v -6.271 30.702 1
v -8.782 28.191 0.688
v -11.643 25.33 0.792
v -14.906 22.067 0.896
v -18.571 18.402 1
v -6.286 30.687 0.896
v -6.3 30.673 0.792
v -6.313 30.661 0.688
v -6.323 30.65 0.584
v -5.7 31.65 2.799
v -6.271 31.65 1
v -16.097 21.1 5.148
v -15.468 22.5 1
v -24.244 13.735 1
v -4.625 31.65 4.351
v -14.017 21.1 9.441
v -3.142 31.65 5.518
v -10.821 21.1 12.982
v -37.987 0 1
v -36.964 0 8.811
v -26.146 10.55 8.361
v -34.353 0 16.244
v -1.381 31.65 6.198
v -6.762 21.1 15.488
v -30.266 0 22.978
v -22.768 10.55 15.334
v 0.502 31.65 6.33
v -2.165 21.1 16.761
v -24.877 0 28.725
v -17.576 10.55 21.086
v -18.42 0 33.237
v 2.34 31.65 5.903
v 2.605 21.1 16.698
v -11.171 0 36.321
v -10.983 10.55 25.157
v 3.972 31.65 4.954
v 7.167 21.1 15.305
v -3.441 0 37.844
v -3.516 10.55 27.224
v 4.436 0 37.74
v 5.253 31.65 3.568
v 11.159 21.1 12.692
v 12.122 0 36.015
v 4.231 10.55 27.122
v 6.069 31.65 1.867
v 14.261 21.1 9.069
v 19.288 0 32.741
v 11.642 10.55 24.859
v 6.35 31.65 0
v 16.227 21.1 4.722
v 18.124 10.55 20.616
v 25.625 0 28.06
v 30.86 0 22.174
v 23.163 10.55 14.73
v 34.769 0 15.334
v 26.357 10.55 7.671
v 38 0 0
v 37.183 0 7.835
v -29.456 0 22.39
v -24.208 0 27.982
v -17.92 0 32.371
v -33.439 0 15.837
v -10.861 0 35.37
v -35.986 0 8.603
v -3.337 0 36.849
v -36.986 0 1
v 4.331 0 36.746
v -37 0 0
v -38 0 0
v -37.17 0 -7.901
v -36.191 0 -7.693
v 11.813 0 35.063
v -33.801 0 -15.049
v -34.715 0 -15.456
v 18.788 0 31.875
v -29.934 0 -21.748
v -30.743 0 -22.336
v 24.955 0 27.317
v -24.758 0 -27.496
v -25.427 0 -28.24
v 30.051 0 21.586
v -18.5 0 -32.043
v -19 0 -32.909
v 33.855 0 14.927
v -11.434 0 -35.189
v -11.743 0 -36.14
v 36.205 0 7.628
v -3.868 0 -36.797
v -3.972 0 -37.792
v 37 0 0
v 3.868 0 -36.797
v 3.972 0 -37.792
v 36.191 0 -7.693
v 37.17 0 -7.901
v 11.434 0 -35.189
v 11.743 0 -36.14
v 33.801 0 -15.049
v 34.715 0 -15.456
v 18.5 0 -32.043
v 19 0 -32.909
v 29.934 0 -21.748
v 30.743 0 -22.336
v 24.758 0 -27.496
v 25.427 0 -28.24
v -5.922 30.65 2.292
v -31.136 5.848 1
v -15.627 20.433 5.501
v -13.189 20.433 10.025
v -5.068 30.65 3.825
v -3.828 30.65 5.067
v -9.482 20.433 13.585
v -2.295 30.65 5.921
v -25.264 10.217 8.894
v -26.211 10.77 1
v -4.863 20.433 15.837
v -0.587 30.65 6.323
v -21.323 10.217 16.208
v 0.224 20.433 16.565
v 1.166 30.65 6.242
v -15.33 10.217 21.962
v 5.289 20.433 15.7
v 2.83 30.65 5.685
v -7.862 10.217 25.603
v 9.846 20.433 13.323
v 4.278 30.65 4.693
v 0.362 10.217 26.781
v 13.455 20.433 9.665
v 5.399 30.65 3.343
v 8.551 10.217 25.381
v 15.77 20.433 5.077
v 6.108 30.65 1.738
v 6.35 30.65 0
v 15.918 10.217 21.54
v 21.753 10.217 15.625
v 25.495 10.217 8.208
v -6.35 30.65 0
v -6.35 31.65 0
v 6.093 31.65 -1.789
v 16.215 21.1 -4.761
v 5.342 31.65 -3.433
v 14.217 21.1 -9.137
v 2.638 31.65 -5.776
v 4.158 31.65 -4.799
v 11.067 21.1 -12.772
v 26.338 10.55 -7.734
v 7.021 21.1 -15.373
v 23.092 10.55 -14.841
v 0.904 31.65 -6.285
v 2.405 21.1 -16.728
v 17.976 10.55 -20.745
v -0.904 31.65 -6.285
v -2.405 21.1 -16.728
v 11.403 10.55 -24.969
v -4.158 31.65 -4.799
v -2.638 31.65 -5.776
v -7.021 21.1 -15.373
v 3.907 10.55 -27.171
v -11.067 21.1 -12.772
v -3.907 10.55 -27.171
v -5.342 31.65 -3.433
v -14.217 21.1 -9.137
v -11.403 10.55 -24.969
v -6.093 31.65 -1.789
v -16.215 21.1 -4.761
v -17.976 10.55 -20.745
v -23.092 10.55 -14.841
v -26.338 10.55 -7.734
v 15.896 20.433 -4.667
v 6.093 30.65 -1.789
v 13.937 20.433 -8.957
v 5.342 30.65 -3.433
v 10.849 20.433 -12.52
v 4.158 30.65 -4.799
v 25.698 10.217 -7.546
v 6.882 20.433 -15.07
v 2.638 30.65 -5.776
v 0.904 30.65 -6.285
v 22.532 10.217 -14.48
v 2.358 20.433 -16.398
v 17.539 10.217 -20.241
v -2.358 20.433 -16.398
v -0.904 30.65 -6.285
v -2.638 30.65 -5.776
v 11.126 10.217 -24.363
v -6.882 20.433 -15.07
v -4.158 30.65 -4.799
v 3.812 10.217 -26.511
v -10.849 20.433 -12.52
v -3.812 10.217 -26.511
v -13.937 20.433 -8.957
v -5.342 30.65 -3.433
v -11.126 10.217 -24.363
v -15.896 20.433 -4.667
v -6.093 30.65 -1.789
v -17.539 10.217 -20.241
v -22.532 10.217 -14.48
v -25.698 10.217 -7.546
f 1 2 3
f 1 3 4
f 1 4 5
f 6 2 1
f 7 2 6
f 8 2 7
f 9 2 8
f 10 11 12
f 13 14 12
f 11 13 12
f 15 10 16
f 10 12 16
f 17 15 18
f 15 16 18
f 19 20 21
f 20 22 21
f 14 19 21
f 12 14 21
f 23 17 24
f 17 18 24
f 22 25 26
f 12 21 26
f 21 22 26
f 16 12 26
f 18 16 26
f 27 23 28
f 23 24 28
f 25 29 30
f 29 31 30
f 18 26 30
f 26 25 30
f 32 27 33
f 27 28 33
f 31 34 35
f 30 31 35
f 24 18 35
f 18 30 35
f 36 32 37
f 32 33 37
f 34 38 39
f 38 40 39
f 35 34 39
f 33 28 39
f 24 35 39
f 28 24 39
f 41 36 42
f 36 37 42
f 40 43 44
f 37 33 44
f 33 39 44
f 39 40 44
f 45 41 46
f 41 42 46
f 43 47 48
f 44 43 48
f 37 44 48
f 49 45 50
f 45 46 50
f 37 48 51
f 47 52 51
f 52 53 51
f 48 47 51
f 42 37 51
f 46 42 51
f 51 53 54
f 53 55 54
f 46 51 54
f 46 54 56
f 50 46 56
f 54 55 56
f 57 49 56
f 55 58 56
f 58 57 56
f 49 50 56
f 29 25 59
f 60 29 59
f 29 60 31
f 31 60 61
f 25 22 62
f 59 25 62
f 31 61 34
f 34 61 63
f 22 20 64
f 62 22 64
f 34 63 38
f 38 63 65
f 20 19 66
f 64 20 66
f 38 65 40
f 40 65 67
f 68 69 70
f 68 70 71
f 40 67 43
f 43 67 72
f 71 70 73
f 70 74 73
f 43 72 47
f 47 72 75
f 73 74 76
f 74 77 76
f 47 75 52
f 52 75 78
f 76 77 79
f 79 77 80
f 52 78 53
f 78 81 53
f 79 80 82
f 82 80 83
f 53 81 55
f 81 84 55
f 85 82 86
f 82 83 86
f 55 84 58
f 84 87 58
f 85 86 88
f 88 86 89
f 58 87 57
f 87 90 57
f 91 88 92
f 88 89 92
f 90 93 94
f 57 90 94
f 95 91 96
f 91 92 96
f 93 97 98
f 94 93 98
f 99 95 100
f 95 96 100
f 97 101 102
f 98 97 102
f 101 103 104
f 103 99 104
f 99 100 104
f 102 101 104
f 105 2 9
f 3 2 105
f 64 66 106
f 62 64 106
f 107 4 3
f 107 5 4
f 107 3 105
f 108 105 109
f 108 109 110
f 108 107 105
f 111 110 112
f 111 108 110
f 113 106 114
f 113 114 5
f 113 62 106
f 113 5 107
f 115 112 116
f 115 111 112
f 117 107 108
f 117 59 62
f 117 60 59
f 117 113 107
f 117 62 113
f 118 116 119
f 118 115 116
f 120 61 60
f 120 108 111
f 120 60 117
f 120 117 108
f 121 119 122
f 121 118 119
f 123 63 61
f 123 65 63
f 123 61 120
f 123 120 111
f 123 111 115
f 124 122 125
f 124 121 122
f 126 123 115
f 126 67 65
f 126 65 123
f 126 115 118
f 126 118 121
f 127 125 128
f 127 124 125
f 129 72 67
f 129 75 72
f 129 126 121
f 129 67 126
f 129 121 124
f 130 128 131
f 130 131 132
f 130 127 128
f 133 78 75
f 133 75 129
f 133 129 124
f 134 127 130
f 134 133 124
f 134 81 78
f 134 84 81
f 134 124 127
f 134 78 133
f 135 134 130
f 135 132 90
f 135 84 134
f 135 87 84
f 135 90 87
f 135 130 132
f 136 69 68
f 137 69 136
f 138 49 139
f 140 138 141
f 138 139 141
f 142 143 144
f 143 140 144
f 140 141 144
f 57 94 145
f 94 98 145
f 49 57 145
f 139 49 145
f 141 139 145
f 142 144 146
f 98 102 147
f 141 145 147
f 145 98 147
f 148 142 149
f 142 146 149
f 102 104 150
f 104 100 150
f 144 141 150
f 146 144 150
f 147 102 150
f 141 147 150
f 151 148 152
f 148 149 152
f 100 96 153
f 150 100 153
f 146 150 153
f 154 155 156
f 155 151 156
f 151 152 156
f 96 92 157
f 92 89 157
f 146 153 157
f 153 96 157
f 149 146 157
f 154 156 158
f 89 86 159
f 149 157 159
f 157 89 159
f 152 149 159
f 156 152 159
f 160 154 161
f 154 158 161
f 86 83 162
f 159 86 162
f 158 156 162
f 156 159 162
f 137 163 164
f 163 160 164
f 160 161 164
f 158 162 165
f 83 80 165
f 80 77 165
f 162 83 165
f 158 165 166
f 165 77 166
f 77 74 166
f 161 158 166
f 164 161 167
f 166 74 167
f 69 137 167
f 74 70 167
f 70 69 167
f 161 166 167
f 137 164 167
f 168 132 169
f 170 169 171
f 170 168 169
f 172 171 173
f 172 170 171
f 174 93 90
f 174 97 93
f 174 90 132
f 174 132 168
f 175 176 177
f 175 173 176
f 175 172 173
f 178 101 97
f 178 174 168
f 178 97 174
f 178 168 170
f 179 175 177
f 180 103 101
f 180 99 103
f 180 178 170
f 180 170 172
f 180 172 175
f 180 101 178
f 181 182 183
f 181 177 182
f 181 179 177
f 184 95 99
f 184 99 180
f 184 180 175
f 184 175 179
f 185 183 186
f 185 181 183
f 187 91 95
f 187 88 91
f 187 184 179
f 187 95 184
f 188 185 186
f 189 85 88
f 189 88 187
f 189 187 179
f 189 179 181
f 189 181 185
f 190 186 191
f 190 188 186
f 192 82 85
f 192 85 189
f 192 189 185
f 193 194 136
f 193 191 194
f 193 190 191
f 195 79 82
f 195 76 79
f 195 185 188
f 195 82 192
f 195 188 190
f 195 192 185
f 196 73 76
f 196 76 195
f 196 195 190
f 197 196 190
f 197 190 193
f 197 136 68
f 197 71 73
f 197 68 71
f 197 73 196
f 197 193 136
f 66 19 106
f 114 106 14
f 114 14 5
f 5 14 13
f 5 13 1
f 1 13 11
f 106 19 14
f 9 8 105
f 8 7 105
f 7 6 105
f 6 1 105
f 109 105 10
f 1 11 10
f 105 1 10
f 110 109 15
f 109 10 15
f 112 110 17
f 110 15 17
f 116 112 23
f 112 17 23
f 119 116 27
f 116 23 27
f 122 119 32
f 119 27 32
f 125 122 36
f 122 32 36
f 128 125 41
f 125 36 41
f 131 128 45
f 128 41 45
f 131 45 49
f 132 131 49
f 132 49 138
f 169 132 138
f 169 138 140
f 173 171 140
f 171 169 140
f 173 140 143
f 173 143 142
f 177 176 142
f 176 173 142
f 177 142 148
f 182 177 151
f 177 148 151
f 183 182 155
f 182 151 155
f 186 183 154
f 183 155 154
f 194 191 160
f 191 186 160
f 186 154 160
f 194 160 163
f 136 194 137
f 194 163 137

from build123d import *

# Parameters (mm, degrees)
SKETCH3_W          = 6.35
SKETCH3_H          = 17.293961796
CUT_EXTRUDE1_DEPTH = 1


with BuildPart() as part:
    # Sketch1 → Revolve1 (revolve)
    with BuildSketch(Plane.XY):
        Polygon((0, 0), (0, 38), (38, 0), align=None)
    revolve(axis=Axis((0, 0, 0), (0, 1, 0)))

    # Sketch2 → Cut-Revolve1 (revolve, cut)
    with BuildSketch(Plane.XY):
        Polygon((0, 0), (0, 37), (37, 0), align=None)
    revolve(axis=Axis((0, 0, 0), (0, 1, 0)), mode=Mode.SUBTRACT)

    # Sketch3 → Cut-Revolve2 (revolve, cut)
    with BuildSketch(Plane(origin=(0, 0, 0), x_dir=(0, 0, -1), z_dir=(1, 0, 0))):
        with Locations((3.175, 34.250129947)):
            Rectangle(SKETCH3_W, SKETCH3_H)
    revolve(axis=Axis((0, 0, 0), (0, 1, 0)), mode=Mode.SUBTRACT)

    # Sketch15 → Cut-Extrude1 (cut)
    with BuildSketch(Plane.XY):
        Polygon((-39.618894295, 0.734384701), (-37.928802574, -0.95570702), (-4.087663697, 32.885431857), (-5.777755418, 34.575523578), align=None)
    extrude(amount=CUT_EXTRUDE1_DEPTH, mode=Mode.SUBTRACT)


solid = part.part
